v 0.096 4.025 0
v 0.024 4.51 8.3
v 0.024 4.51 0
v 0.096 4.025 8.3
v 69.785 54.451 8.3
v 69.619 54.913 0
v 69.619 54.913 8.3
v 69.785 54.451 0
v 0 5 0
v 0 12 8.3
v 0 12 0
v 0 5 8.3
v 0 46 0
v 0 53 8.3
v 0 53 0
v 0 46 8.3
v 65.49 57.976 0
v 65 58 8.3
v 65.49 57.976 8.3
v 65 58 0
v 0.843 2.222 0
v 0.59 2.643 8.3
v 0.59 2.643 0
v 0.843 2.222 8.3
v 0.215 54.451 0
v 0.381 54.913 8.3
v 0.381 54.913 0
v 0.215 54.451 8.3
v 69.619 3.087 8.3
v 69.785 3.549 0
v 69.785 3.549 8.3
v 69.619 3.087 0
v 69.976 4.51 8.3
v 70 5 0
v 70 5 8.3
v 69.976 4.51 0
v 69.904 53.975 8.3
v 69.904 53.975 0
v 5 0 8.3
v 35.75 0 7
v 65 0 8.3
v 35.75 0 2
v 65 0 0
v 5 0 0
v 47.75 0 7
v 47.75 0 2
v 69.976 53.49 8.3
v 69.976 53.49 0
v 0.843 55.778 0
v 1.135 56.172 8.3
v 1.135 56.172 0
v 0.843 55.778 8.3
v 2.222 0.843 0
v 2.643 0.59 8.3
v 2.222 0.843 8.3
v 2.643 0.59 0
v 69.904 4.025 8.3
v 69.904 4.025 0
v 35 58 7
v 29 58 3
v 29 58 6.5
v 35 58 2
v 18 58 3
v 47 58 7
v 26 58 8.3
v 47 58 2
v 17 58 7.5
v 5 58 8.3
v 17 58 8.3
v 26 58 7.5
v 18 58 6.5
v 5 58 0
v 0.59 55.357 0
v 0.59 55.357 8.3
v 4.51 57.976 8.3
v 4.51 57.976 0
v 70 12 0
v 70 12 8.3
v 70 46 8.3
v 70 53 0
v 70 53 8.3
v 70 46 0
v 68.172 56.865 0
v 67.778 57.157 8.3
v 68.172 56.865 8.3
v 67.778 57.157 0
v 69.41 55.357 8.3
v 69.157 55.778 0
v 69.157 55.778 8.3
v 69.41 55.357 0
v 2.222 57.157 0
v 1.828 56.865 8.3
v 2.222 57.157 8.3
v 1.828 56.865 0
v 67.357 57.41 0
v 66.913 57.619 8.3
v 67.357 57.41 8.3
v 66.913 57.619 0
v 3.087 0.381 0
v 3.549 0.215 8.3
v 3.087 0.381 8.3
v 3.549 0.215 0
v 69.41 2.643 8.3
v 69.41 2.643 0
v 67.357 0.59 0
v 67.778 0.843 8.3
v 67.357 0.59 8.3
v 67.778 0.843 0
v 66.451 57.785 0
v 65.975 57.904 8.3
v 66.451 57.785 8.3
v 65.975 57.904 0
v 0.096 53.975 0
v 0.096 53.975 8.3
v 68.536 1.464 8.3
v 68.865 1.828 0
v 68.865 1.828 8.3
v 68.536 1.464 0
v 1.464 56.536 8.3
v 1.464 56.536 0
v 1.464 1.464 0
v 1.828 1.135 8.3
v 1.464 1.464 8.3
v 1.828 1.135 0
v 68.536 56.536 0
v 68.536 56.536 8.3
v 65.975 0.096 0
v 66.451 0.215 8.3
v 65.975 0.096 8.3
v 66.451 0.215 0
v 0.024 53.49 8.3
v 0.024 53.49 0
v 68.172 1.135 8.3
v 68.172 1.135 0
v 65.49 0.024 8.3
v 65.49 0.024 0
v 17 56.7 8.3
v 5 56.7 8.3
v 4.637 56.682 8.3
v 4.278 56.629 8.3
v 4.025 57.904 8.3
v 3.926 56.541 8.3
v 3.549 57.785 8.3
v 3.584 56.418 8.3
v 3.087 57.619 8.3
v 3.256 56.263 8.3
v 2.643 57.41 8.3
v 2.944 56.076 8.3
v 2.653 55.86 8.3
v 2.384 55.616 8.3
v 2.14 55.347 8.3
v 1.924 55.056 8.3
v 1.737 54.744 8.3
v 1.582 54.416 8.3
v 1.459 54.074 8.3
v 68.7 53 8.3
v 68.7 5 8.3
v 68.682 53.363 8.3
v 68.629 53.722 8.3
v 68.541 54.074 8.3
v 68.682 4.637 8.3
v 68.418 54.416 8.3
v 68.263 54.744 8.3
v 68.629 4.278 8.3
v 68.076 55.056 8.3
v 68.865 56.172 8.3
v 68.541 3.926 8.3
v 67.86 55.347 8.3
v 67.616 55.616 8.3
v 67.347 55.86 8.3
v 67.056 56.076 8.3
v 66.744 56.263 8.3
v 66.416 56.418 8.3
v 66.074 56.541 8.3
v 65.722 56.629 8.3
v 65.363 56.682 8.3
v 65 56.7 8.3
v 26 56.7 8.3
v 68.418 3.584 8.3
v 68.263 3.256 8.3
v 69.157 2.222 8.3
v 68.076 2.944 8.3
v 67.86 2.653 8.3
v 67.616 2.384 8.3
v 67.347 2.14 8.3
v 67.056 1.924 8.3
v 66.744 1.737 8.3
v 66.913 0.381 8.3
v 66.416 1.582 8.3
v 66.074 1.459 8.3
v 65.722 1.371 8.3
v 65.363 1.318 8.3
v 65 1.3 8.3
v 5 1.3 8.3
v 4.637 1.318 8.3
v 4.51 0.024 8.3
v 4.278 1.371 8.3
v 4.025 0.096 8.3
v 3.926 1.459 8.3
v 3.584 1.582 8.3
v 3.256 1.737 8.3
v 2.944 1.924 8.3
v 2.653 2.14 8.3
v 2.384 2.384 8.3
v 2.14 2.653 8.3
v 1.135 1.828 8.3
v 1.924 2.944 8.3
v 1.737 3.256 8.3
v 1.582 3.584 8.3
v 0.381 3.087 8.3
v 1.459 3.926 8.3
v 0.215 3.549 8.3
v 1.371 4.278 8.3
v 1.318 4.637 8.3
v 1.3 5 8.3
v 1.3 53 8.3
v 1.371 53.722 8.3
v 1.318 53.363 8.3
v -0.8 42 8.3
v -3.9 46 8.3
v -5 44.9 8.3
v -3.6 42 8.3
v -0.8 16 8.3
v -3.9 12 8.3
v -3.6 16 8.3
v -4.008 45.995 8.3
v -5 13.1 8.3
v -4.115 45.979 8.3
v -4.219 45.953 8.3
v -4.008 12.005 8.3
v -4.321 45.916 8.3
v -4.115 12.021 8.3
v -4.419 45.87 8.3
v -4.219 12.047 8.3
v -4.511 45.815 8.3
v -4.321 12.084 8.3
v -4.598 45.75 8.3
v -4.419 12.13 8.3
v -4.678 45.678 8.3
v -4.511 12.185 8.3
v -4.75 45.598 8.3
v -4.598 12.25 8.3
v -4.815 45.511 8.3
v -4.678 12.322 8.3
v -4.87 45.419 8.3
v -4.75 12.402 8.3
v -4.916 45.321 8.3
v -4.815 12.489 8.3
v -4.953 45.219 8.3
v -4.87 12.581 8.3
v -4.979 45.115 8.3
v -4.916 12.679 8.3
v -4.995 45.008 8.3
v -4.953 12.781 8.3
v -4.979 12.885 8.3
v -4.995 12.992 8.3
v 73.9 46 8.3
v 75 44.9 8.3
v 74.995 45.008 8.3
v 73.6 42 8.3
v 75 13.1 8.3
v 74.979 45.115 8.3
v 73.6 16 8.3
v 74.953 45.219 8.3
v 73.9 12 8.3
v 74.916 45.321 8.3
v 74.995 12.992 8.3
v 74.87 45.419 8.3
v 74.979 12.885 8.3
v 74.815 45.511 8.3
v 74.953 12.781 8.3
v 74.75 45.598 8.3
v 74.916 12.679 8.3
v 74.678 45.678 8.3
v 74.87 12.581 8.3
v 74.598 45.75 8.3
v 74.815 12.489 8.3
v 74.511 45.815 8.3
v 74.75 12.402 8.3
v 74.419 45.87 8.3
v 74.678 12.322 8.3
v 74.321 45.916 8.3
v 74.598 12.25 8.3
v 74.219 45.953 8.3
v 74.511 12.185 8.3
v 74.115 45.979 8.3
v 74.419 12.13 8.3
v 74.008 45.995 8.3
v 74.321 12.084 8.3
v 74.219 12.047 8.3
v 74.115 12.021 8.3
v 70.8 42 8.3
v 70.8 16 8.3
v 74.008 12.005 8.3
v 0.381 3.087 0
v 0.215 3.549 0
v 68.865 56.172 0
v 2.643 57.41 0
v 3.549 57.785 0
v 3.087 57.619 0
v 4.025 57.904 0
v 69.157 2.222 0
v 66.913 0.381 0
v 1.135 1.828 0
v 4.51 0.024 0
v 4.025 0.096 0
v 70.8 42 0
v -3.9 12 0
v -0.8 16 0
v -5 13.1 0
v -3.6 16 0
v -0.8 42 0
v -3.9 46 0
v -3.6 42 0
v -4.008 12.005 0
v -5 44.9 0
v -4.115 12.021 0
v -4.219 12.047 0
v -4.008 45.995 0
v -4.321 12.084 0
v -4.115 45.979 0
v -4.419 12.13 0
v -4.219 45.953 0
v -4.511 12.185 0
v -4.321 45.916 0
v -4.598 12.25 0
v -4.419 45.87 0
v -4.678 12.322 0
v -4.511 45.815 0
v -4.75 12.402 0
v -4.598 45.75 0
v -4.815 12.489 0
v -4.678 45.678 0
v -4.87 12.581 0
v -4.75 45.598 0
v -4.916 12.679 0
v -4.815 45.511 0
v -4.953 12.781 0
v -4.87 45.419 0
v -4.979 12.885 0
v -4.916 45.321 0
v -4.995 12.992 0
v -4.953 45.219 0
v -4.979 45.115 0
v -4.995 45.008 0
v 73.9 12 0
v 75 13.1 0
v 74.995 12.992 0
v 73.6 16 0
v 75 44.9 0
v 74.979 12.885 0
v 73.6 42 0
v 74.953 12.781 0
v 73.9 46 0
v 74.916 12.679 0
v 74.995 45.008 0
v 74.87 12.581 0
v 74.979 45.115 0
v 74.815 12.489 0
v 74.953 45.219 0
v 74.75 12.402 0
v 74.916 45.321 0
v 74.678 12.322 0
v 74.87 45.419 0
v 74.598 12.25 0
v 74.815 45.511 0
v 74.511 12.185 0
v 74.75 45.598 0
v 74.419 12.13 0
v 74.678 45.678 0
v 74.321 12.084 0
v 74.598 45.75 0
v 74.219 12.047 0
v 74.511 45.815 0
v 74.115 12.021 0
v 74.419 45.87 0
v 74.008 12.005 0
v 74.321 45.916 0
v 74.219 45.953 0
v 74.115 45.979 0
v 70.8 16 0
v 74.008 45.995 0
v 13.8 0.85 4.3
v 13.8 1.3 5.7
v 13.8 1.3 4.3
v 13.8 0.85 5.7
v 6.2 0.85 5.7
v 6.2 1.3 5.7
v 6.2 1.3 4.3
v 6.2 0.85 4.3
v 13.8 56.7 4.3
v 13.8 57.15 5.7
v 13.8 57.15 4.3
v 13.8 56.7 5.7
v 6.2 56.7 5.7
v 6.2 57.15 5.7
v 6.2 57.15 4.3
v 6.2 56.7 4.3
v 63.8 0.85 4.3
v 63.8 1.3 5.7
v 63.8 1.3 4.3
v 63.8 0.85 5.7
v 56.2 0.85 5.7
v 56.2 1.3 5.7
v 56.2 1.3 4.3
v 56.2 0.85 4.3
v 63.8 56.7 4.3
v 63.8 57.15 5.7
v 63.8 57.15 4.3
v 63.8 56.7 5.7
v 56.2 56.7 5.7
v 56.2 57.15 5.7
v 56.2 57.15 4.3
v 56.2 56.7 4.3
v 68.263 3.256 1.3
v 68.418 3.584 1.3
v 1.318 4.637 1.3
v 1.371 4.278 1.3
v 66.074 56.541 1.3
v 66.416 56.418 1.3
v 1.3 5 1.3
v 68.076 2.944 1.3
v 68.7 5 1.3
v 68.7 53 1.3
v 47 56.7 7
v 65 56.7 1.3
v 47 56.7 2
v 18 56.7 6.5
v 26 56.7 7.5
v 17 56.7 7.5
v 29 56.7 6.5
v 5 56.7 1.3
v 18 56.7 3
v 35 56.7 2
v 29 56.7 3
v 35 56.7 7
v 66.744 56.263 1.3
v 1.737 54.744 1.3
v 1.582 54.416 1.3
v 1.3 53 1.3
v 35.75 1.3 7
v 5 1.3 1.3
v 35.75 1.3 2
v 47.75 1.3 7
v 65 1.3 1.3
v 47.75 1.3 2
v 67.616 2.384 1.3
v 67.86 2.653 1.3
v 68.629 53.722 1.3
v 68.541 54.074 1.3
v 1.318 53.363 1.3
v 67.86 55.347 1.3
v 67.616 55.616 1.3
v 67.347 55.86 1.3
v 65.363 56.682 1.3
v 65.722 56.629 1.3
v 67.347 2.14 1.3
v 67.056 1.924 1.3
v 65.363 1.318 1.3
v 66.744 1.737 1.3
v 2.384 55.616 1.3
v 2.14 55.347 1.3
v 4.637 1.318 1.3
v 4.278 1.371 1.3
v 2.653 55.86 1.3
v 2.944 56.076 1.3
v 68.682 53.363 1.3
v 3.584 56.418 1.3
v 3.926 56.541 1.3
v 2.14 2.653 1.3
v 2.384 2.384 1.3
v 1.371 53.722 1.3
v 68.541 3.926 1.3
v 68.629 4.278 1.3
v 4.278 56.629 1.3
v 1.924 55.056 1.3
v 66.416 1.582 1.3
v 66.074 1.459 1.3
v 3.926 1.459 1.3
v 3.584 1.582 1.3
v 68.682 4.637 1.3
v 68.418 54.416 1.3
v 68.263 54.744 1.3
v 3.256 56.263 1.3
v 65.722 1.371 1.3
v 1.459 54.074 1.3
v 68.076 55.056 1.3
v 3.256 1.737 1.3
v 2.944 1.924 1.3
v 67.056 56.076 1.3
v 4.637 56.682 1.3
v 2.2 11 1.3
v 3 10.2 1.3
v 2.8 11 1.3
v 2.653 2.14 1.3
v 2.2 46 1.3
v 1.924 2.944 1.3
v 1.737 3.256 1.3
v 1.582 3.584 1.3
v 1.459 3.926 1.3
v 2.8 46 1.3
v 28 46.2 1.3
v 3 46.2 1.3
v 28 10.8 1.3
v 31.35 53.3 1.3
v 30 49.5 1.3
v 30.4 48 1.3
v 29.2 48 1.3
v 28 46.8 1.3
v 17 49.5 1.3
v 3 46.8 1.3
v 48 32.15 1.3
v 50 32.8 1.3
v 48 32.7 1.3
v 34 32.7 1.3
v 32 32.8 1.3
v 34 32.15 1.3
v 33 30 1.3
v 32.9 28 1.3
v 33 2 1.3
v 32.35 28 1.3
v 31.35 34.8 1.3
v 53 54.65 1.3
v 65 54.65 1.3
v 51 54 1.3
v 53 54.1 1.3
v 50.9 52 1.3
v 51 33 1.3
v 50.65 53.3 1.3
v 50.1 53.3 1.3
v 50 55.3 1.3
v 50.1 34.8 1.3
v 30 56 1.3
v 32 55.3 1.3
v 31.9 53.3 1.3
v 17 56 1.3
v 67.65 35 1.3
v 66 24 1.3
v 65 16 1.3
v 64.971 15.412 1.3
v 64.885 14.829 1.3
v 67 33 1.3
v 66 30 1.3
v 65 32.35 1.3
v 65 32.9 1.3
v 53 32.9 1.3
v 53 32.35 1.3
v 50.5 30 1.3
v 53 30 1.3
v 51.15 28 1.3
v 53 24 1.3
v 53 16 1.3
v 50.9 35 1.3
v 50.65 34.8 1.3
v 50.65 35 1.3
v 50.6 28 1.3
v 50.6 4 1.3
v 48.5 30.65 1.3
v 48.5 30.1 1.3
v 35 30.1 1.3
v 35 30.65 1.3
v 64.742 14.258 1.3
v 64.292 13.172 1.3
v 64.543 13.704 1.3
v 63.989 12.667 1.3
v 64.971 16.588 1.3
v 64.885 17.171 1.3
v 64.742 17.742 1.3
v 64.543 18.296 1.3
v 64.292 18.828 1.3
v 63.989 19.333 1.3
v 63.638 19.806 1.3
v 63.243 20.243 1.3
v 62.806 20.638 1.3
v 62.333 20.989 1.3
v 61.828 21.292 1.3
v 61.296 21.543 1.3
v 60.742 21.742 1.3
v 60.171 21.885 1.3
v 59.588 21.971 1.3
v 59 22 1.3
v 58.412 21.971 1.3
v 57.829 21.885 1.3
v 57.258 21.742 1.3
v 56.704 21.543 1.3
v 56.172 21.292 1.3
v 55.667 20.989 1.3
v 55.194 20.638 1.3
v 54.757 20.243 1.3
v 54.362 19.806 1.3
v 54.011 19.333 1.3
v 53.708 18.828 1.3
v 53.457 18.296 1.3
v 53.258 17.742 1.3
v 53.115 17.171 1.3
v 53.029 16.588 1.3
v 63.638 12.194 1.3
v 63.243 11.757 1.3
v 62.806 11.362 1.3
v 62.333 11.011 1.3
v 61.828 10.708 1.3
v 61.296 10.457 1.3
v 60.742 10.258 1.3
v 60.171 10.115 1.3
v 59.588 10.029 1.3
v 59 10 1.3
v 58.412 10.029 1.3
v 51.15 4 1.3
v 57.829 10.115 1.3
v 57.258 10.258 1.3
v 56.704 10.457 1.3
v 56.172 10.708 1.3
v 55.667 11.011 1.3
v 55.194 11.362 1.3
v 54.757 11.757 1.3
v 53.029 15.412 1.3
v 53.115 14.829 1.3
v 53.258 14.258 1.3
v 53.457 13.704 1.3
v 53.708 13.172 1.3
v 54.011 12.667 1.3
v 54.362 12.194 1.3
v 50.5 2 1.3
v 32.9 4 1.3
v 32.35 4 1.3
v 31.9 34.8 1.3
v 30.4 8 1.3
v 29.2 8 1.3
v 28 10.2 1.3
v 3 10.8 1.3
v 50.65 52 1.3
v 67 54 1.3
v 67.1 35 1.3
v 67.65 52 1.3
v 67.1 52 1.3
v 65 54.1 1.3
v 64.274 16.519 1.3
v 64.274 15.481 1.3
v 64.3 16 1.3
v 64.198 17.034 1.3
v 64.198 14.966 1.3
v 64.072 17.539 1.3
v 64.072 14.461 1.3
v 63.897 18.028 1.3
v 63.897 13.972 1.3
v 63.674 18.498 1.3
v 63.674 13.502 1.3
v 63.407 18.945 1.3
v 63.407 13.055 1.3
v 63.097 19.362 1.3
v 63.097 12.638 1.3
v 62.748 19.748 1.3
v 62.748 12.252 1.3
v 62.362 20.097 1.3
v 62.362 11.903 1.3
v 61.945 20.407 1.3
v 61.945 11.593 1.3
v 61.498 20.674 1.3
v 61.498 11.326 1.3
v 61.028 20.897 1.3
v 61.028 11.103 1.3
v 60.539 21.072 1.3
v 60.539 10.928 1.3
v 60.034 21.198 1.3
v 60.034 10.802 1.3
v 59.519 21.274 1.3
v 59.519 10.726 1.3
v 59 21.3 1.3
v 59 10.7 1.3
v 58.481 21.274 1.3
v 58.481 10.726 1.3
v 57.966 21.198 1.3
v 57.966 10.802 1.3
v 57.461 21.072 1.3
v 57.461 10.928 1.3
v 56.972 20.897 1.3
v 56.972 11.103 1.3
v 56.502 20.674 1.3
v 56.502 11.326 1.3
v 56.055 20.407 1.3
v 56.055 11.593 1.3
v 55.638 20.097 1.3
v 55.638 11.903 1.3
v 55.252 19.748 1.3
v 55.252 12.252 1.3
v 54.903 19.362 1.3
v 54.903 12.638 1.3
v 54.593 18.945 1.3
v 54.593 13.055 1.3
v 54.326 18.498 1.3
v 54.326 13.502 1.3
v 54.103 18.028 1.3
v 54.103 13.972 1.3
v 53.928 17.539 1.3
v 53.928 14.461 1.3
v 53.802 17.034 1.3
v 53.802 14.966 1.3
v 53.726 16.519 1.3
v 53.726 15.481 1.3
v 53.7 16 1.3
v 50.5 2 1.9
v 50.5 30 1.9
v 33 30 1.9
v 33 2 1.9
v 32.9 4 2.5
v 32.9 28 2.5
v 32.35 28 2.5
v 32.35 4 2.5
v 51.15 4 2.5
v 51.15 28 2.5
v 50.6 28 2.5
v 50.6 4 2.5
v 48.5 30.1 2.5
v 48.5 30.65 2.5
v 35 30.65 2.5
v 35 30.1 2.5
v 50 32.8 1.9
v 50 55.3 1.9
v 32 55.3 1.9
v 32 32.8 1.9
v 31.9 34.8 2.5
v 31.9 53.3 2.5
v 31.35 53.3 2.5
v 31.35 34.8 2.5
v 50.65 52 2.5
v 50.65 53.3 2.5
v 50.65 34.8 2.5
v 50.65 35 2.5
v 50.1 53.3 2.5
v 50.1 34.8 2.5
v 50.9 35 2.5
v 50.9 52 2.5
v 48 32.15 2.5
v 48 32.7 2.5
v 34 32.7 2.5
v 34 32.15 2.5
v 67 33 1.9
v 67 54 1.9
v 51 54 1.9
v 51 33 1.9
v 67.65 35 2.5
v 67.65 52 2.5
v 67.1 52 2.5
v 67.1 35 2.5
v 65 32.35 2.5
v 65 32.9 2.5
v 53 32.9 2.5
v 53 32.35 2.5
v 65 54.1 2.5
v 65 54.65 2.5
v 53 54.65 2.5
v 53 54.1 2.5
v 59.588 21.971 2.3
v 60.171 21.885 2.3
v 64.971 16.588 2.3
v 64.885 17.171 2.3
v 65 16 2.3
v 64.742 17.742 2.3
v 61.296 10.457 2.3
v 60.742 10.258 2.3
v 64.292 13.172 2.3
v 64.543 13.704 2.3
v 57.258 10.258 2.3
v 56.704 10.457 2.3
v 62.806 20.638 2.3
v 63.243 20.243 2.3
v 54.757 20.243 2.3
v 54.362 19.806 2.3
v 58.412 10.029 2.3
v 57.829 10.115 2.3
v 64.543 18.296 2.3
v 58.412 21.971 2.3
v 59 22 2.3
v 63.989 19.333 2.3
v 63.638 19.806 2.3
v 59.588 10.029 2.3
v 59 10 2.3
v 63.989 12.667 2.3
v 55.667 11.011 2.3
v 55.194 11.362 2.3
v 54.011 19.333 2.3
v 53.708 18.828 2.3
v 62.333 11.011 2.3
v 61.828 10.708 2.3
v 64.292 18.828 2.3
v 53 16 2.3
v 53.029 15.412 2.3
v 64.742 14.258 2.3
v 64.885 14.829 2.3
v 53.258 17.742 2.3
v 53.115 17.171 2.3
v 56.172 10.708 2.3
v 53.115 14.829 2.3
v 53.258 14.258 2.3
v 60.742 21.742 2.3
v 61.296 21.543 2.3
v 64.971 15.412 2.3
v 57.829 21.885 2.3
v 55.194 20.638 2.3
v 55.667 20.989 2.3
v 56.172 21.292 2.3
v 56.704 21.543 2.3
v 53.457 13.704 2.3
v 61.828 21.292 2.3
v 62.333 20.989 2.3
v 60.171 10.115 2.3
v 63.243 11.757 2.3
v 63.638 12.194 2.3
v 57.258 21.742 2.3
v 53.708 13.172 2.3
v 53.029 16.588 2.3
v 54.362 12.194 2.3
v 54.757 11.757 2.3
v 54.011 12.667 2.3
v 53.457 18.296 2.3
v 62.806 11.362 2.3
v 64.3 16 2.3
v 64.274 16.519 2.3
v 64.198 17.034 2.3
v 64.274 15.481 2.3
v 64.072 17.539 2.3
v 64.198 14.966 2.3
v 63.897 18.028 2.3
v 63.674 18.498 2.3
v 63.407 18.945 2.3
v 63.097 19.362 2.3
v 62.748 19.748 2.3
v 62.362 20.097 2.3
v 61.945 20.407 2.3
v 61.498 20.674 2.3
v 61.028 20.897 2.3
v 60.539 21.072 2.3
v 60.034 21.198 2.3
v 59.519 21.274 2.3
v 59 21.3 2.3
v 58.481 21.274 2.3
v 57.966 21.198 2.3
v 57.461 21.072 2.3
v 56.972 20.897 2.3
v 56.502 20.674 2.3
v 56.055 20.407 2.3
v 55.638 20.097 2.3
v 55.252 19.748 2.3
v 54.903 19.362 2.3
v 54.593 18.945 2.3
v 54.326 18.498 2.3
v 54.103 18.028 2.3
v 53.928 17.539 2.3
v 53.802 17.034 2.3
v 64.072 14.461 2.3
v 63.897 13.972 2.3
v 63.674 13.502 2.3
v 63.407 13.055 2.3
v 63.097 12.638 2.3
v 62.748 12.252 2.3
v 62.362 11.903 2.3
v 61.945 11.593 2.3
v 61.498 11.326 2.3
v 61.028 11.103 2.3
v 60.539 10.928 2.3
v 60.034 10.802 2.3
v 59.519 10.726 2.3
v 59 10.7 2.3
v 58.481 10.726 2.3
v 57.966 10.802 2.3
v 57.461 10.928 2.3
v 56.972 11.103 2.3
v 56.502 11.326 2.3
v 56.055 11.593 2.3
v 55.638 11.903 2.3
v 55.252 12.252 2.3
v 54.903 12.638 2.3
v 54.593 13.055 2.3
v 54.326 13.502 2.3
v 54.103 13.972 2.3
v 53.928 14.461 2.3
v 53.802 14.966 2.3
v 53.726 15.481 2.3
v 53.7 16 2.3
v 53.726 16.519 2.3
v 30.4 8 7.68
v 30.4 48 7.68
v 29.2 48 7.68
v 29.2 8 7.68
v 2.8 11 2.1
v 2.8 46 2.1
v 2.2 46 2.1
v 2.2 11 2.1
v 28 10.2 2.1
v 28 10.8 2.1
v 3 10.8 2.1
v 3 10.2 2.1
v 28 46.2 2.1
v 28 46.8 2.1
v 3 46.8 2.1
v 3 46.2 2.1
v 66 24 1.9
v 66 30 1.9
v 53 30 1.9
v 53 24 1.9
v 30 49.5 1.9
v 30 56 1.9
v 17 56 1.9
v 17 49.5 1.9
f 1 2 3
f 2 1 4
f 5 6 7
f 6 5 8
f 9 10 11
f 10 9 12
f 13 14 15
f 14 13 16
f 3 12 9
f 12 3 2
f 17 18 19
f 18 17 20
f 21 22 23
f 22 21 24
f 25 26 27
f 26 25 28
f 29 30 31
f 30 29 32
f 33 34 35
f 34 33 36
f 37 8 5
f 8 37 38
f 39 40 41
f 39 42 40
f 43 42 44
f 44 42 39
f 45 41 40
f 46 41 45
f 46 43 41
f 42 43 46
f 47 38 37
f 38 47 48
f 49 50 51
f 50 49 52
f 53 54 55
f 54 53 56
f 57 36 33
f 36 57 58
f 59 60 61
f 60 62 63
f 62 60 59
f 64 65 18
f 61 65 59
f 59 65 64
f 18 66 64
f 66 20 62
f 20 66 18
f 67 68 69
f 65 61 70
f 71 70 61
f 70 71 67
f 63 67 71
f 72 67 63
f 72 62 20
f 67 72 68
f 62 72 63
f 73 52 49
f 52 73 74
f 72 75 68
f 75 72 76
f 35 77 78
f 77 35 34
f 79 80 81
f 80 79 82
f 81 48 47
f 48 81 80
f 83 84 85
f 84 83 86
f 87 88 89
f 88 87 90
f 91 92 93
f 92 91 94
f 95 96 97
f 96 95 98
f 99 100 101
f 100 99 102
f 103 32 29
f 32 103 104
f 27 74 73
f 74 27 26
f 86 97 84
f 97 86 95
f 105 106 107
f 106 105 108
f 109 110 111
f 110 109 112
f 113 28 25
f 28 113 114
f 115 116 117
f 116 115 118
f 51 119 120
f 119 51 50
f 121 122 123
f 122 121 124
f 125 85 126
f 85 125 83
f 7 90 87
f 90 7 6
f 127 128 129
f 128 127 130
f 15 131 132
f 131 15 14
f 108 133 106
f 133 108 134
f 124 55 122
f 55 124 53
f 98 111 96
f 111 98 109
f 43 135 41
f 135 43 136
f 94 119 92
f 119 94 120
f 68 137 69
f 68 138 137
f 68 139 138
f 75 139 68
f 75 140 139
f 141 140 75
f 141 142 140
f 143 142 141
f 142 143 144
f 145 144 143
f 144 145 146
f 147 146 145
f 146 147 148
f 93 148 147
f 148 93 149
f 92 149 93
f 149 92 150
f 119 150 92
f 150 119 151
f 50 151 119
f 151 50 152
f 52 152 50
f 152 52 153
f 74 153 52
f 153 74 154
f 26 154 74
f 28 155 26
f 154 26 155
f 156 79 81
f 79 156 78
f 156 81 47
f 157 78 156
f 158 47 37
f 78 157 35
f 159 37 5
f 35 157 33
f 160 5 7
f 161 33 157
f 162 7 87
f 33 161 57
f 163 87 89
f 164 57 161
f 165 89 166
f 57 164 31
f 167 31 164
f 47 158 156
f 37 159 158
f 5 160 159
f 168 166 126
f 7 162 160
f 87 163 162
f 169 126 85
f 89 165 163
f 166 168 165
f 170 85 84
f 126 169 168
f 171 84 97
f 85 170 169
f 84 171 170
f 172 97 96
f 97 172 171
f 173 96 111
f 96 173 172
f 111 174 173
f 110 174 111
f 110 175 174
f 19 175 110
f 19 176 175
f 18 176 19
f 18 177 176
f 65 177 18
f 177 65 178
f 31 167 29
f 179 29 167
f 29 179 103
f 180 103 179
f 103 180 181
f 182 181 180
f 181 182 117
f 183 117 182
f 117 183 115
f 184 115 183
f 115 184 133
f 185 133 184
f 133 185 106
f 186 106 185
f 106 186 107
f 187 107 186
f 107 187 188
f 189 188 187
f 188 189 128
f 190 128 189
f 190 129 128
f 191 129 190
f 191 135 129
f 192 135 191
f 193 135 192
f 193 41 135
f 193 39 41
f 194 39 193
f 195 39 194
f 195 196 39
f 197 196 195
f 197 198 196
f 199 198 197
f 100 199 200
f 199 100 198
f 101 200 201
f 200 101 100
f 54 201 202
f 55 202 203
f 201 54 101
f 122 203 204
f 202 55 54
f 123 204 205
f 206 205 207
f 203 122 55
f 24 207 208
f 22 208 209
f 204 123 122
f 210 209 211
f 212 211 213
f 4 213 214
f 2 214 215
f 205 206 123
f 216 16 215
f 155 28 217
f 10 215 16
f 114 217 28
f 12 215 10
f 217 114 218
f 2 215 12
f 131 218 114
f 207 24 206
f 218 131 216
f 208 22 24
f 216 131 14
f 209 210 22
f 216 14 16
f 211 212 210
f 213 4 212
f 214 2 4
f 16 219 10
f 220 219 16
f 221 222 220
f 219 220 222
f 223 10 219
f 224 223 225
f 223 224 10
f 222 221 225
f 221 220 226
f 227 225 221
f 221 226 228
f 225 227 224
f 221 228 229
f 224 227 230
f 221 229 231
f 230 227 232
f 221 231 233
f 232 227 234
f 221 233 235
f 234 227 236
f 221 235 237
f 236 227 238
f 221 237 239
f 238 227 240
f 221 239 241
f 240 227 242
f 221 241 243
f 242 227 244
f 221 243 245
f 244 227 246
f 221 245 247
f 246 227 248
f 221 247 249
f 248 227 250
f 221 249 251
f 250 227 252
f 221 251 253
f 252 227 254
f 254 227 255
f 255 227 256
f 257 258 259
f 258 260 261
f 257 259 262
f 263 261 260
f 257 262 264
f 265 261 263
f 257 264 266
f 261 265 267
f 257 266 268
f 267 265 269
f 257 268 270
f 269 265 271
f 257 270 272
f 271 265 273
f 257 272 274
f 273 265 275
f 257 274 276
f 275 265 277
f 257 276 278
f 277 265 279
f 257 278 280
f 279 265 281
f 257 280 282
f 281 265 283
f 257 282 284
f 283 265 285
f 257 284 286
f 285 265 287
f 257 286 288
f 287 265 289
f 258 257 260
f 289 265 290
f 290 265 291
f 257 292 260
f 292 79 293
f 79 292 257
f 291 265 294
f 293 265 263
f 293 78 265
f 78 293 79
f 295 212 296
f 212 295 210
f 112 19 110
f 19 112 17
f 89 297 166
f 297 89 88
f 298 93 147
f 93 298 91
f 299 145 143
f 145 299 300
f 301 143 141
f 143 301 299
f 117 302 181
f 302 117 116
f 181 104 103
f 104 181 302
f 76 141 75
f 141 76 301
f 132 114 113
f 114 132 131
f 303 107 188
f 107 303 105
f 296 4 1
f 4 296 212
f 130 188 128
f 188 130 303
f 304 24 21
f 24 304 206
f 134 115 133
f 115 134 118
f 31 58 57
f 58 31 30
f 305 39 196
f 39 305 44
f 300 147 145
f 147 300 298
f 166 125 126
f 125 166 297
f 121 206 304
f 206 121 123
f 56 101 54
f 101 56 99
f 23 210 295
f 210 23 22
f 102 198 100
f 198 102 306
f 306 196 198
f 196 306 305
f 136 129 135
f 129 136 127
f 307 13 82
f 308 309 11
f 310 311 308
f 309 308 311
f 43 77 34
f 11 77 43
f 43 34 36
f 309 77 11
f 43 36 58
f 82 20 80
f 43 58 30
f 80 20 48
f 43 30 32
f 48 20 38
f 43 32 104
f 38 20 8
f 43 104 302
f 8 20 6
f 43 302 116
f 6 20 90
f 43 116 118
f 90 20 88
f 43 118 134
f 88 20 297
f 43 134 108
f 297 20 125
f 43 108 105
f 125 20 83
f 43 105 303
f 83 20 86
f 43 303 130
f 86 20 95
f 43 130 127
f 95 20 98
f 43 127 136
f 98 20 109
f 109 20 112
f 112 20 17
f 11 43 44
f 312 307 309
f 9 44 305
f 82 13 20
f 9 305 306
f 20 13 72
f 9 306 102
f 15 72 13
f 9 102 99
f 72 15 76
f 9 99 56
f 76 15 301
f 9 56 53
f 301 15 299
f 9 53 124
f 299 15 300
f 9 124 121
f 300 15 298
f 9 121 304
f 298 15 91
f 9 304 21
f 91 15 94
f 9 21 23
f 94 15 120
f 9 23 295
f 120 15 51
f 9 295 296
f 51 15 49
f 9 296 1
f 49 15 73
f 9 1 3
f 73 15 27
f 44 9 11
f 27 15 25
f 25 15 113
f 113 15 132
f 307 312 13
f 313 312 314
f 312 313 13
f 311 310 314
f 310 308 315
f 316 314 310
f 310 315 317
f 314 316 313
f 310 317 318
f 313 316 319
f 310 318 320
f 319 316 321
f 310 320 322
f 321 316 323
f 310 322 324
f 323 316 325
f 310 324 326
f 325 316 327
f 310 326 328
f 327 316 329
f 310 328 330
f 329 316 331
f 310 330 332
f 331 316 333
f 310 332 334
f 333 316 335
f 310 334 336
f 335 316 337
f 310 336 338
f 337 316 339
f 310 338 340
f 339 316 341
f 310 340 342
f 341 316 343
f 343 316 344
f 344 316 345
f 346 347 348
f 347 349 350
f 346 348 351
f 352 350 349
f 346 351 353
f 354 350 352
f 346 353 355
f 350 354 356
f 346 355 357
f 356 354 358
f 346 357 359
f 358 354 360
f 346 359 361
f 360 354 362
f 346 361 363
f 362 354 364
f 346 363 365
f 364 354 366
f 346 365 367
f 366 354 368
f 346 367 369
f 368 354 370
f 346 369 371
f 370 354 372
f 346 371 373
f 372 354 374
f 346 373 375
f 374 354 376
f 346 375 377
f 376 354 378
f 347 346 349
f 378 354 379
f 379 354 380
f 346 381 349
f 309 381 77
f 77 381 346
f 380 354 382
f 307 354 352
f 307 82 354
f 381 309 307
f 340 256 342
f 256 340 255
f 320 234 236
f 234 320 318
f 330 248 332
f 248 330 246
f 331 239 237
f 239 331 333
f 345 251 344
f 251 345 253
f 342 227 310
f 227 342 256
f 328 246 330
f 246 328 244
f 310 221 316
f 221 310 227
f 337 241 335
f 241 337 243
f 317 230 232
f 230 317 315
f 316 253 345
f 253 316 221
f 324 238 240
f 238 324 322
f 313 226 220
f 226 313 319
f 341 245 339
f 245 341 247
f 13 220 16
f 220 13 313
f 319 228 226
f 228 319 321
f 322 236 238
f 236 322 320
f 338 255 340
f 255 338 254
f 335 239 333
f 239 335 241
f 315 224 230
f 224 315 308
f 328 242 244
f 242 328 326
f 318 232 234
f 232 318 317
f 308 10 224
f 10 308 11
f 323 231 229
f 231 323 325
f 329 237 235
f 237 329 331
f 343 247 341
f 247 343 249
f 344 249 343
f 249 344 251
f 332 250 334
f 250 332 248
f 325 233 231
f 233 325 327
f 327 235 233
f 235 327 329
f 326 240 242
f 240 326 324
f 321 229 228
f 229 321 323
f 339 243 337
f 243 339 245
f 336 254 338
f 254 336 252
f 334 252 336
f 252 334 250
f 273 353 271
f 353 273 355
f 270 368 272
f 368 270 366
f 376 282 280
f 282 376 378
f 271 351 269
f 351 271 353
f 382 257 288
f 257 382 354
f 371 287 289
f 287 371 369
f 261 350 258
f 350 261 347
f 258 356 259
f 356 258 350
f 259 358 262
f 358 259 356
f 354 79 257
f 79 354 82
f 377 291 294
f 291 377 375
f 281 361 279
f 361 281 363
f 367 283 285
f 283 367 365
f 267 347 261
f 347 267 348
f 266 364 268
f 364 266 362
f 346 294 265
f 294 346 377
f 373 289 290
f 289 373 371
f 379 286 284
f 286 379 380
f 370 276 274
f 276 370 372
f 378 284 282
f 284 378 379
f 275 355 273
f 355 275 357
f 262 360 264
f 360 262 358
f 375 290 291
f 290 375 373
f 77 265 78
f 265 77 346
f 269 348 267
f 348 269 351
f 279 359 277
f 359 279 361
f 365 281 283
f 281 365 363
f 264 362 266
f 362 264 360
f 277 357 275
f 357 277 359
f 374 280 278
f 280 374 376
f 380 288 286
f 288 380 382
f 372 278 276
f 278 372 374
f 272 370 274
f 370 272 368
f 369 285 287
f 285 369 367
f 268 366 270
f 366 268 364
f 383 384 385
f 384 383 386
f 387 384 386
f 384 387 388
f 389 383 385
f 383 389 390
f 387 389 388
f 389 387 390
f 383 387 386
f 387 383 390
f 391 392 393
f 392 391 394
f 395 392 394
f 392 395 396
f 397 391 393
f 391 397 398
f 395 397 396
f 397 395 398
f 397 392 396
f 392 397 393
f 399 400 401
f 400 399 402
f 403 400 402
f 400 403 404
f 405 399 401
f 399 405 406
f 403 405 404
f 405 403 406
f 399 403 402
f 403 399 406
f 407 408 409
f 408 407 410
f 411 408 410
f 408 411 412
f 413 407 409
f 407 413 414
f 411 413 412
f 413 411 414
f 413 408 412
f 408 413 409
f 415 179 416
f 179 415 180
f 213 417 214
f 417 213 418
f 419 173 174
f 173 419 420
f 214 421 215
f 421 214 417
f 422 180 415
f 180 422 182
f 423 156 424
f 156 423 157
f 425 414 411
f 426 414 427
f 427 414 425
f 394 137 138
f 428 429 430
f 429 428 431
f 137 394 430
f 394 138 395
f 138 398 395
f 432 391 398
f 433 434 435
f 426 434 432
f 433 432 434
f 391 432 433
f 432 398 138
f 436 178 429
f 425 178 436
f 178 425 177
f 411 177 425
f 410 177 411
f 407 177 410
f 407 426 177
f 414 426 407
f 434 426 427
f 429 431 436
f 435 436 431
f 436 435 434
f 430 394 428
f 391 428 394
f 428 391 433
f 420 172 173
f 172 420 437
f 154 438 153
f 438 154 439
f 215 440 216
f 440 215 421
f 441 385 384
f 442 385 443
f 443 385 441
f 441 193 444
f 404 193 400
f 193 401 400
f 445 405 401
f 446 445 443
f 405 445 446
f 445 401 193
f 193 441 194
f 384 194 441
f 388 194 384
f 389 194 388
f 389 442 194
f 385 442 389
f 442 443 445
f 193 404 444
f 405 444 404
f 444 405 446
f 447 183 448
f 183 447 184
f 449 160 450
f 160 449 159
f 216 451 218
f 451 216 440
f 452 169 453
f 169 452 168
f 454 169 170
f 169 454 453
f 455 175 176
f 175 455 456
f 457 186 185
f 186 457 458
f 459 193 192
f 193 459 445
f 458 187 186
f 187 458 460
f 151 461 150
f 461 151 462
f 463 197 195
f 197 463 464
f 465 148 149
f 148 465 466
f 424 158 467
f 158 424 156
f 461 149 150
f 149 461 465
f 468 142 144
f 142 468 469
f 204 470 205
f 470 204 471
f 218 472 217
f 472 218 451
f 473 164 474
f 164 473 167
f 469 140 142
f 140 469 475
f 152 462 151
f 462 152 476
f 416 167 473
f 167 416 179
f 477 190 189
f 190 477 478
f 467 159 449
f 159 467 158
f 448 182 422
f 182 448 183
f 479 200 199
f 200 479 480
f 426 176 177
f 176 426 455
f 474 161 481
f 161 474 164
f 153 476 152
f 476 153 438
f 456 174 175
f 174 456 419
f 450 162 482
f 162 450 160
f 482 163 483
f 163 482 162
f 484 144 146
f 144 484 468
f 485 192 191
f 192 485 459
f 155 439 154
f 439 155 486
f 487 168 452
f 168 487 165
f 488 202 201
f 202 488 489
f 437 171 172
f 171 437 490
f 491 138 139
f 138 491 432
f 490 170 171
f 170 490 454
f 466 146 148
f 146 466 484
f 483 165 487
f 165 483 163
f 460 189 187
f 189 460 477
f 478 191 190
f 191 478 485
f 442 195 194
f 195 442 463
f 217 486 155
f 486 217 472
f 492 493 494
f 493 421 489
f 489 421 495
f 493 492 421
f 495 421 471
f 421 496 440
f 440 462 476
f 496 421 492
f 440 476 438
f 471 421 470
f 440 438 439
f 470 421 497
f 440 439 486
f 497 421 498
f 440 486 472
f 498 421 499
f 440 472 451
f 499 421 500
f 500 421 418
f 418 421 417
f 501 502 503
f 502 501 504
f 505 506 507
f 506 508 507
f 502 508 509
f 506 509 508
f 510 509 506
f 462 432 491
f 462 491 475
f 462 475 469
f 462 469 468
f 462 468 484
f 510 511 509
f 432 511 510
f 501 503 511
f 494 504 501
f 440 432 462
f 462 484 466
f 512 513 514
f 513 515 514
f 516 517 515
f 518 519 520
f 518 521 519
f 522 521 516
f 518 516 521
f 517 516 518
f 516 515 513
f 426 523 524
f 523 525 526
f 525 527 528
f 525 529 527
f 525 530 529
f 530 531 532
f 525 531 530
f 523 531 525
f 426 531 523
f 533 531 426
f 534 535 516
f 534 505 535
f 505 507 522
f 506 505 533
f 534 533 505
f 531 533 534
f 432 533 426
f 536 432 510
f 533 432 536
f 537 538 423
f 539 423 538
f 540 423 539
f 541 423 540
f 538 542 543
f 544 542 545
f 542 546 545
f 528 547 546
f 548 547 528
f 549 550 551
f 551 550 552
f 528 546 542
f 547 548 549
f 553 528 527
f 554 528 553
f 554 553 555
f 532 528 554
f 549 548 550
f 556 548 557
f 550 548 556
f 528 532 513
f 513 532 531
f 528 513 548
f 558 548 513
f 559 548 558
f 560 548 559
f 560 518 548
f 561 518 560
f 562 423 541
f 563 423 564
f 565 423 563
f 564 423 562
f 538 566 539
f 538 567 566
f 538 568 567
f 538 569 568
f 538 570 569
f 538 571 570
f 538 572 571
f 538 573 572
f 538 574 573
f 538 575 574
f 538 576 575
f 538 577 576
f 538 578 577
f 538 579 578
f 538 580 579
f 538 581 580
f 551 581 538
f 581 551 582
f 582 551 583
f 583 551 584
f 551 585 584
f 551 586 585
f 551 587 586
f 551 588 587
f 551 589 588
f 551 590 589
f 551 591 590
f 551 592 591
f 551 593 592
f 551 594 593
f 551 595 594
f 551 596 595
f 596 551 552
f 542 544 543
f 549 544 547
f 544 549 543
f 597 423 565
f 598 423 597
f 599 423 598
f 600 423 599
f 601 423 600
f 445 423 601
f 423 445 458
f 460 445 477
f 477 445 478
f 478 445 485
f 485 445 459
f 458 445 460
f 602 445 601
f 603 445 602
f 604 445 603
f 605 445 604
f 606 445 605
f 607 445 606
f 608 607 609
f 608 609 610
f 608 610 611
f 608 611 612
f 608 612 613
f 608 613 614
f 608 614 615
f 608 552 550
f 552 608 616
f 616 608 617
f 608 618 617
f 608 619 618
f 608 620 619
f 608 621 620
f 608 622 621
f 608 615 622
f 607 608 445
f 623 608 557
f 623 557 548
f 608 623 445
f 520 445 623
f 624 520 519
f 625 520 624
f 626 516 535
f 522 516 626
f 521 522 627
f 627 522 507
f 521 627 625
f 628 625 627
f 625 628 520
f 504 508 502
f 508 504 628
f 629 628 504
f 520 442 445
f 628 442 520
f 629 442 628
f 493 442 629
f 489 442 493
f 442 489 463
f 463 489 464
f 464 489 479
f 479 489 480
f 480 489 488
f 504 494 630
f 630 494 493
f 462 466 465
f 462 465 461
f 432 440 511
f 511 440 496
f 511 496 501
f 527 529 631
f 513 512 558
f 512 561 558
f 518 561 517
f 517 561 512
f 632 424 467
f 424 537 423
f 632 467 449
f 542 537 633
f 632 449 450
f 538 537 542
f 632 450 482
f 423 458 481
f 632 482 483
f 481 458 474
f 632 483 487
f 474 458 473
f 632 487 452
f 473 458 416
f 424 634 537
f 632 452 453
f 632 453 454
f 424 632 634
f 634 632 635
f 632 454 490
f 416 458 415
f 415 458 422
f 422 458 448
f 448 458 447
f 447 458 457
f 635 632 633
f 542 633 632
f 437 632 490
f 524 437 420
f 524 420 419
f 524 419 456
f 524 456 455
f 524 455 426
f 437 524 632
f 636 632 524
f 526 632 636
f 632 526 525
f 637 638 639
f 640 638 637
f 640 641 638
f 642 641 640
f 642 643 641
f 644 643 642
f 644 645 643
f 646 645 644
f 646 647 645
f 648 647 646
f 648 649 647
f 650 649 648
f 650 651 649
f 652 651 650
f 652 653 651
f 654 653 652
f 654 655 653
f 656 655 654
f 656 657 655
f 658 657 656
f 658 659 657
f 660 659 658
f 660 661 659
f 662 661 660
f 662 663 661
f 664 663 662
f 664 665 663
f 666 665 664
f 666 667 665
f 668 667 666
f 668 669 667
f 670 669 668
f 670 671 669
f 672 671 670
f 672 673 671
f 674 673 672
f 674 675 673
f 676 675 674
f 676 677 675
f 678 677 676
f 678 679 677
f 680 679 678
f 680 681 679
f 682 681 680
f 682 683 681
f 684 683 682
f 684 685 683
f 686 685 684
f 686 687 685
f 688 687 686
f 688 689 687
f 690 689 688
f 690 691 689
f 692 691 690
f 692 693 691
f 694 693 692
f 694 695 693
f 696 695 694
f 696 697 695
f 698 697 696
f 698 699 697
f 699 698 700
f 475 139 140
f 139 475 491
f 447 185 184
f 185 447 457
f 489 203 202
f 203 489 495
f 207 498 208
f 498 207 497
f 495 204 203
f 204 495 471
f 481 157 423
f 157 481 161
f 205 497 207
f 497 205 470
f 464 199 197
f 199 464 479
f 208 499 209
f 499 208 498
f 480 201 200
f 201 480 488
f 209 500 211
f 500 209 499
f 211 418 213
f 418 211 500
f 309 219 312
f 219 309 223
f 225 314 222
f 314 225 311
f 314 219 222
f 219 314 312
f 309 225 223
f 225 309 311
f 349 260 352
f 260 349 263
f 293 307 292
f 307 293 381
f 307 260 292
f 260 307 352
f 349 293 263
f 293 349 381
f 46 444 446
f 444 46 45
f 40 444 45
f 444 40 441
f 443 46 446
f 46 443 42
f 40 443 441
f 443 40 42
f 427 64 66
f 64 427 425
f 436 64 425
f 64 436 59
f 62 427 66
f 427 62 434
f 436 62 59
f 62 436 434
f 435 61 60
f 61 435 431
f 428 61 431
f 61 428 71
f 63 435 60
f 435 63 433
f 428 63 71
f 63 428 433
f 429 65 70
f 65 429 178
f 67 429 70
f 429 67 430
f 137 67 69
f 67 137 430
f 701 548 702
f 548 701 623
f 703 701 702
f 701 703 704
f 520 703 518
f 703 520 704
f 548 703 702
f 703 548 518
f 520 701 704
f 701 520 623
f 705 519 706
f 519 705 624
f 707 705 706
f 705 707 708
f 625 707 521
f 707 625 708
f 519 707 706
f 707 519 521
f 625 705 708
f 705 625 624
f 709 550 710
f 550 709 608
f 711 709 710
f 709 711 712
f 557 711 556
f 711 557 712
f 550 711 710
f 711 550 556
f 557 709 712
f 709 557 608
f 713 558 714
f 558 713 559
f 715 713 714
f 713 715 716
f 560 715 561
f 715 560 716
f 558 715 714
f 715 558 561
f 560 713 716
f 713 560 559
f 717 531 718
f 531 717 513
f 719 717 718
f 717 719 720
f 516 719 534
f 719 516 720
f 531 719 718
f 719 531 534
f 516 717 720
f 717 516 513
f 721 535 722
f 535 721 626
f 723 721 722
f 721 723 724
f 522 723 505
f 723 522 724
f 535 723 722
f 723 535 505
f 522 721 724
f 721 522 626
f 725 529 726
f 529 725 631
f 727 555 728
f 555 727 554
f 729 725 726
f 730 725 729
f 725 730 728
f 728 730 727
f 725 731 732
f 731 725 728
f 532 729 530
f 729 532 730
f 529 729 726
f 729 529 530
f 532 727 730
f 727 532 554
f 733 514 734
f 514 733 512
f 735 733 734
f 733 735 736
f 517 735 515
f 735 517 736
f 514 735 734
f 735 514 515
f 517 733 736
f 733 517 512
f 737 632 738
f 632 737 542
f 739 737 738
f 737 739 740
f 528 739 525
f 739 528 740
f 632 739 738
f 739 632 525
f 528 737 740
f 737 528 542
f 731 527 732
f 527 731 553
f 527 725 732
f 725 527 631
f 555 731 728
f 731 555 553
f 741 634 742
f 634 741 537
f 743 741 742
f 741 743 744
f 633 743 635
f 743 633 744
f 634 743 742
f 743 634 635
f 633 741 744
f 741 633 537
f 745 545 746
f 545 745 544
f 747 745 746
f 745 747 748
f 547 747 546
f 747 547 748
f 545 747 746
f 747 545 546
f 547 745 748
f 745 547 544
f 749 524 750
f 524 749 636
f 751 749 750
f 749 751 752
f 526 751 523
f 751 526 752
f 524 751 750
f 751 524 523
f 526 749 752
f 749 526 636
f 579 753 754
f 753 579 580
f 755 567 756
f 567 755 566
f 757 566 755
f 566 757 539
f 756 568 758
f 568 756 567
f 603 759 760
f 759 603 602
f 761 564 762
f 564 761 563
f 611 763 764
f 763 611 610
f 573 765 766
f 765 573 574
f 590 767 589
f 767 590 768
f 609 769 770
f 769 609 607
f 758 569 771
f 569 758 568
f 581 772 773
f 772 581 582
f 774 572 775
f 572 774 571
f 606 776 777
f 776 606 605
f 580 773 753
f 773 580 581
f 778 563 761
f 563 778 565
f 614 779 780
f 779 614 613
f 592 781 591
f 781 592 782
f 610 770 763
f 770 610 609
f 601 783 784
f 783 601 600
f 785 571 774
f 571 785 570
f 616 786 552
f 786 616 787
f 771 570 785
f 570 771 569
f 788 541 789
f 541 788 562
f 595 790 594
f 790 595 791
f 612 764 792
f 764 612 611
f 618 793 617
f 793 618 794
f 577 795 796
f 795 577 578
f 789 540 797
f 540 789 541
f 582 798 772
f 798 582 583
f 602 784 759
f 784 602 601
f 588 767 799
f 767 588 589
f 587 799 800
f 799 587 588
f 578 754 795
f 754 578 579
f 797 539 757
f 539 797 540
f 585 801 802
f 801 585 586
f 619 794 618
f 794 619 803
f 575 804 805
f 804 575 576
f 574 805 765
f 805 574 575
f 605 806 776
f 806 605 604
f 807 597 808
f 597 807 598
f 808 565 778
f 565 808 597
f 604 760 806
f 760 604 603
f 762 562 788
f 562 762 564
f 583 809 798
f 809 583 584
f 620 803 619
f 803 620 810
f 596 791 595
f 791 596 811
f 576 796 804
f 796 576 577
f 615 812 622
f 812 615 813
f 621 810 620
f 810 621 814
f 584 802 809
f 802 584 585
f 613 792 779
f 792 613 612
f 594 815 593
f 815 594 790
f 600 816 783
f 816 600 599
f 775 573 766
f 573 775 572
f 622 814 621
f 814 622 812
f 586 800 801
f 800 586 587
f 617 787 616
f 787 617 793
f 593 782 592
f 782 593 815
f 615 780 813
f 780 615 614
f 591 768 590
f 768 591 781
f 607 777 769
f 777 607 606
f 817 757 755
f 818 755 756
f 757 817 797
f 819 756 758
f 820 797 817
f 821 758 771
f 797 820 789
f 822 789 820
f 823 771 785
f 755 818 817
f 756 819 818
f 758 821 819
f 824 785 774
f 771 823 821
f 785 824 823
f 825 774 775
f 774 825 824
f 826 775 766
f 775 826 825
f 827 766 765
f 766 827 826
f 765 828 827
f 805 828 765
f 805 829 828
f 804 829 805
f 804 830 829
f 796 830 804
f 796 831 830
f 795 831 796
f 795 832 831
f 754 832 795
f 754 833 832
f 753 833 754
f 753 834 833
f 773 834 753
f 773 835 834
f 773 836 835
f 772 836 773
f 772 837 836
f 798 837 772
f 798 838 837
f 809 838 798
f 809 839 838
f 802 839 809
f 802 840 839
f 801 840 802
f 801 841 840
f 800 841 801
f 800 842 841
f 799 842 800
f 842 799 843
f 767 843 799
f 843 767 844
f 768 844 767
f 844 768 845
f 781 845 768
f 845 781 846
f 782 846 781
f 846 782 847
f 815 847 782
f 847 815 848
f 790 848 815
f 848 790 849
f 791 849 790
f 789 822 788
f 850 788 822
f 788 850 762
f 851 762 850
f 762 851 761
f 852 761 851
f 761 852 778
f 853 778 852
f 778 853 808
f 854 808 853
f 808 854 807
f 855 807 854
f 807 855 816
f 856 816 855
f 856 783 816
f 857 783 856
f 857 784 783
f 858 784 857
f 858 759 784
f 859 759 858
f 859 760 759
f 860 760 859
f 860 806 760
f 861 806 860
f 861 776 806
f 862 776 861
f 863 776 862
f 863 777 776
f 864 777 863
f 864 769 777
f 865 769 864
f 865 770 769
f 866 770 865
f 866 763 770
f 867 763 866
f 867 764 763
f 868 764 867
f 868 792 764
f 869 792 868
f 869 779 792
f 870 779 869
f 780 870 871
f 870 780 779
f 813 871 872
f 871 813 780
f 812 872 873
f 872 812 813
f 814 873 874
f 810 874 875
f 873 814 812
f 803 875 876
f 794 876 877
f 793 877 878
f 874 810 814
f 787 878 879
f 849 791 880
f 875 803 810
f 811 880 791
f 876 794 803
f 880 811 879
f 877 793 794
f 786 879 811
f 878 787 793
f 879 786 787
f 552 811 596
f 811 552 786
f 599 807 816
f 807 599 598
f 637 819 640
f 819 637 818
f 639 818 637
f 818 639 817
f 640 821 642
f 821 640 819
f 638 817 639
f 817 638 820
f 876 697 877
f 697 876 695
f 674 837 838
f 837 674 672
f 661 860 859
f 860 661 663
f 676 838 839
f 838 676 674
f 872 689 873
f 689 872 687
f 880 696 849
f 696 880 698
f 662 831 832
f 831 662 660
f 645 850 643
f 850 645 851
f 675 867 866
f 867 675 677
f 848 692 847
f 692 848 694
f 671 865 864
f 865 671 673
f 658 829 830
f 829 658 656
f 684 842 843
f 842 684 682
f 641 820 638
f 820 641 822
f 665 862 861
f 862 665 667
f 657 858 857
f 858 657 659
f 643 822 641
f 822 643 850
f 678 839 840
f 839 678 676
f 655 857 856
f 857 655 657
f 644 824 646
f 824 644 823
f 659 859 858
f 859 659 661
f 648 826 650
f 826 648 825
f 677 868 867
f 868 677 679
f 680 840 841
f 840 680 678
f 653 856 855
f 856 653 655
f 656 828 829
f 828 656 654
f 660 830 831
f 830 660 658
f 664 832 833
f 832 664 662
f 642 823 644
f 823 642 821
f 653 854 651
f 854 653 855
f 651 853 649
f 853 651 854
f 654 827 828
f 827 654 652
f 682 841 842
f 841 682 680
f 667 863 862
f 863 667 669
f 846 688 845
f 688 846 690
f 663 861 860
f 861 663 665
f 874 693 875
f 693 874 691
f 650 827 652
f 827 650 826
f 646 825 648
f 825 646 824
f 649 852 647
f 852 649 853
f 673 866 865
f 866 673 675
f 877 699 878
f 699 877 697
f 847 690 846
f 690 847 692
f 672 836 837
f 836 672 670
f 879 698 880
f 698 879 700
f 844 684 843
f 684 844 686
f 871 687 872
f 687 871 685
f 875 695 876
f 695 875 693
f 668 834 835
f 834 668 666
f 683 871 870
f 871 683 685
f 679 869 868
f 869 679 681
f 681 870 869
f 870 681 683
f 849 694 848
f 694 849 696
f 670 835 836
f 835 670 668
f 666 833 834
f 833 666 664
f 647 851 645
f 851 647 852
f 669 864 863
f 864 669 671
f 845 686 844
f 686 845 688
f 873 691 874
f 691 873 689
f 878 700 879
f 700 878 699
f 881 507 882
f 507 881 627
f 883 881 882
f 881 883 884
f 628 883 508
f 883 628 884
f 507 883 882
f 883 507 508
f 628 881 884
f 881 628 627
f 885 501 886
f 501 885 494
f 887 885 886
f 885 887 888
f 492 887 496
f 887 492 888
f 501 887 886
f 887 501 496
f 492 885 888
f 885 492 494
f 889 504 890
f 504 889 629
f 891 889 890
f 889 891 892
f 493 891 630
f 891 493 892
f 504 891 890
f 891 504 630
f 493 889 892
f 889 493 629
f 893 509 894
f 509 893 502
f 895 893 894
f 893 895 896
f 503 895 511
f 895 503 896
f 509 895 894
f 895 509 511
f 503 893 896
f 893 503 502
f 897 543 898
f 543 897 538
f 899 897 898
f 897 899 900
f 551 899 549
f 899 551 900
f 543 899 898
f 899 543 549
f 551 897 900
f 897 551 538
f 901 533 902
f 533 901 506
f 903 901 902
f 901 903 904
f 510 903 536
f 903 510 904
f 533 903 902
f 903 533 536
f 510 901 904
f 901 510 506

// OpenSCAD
// Spine Smart v3 — revised prototype for stage I.
// Nominal component envelopes from Sizes-1.pdf, not measured purchased parts.
// Units: mm. Print bottom and lid separately; do not print assembled view.
$fn=64;
mode=1; // 0 assembled, 1 bottom, 2 lid on bed, 3 exploded, 4 component plan
L=70; W=58; H=9.6;
wall=1.3; floor_t=1.3; lid_t=1.3; base_h=H-lid_t; corner=5;
clip_x=[10,60]; clip_width=7; clip_t=0.7; clip_gap=0.25;
clip_length=4.5; catch_depth=0.30;
// Adjustable connector openings: verify alignment with actual modules.
charge_x=41.75; esp_usb_x=41; usb_width=12; usb_height=5; usb_z=2.0;
switch_x=18; switch_slot_w=11; switch_slot_h=3.5; switch_z=3.0;

module rounded_box(l,w,h,r) {
    linear_extrude(height=h)
        hull() for(x=[r,l-r],y=[r,w-r]) translate([x,y]) circle(r=r);
}

module board_seat(x,y,w,l,front_open=false,back_open=false) {
    // Adhesive seat, not an unverified screw-hole pattern.
    translate([x,y,floor_t-0.02]) cube([w,l,0.62]);
    translate([x-0.65,y+2,floor_t-0.02]) cube([0.55,l-4,1.22]);
    translate([x+w+0.1,y+2,floor_t-0.02]) cube([0.55,l-4,1.22]);
    if(!front_open) translate([x+2,y-0.65,floor_t-0.02]) cube([w-4,0.55,1.22]);
    if(!back_open) translate([x+2,y+l+0.1,floor_t-0.02]) cube([w-4,0.55,1.22]);
}

module bottom() {
    union() {
        difference() {
            union() {
                rounded_box(L,W,base_h,corner);
                // Closed strap loops: through holes along Z, linked at both ends.
                translate([-5,(W-34)/2,0]) rounded_box(6.1,34,base_h,1.1);
                translate([L-1.1,(W-34)/2,0]) rounded_box(6.1,34,base_h,1.1);
            }
            translate([wall,wall,floor_t])
                rounded_box(L-2*wall,W-2*wall,base_h+0.2,corner-wall);
            translate([-3.6,(W-26)/2,-0.1]) cube([2.8,26,base_h+0.2]);
            translate([L+0.8,(W-26)/2,-0.1]) cube([2.8,26,base_h+0.2]);
            // Four local snap pockets; solid wall above each pocket.
            for(xx=clip_x) {
                translate([xx-3.8,wall-0.45,base_h-4.0]) cube([7.6,0.75,1.4]);
                translate([xx-3.8,W-wall-0.30,base_h-4.0]) cube([7.6,0.75,1.4]);
            }
            // Charging USB-C and programming USB-C, on opposite ends.
            translate([charge_x-usb_width/2,-0.1,usb_z]) cube([usb_width,wall+0.2,usb_height]);
            translate([esp_usb_x-usb_width/2,W-wall-0.1,usb_z]) cube([usb_width,wall+0.2,usb_height]);
            // Switch actuator opening. Tune to the actual purchased switch.
            translate([switch_x,W-wall-0.1,switch_z]) cube([switch_slot_w,wall+0.2,switch_slot_h]);
            // Nail recess, away from ports, under the lid edge.
            translate([17,W-wall-0.1,base_h-0.8]) cube([9,wall+0.2,1.0]);
        }
        // Battery / electronics separator; end gaps allow wires around it.
        translate([29.2,8,floor_t-0.02]) cube([1.2,40,base_h-floor_t-0.6]);
        // Battery locating stops; mounting with a thin adhesive strip.
        translate([2.2,11,floor_t-0.02]) cube([0.6,35,0.82]);
        translate([3,10.2,floor_t-0.02]) cube([25,0.6,0.82]);
        translate([3,46.2,floor_t-0.02]) cube([25,0.6,0.82]);
        board_seat(33,2,17.5,28,true,false); // TP4056, connector faces front
        board_seat(32,32.8,18,22.5,false,true); // ESP32-C3, USB faces rear
        board_seat(51,33,16,21); // MPU6050, direct soldering, no pin headers
        // Coin motor locator. Inner diameter allows a nominal 10 mm motor.
        translate([59,16,floor_t-0.02]) difference() {
            cylinder(d=12,h=1.02);
            translate([0,0,-0.1]) cylinder(d=10.6,h=1.3);
        }
        // Free mounting seats for driver passives and switch.
        translate([53,24,floor_t-0.02]) cube([13,6,0.62]);
        translate([17,49.5,floor_t-0.02]) cube([13,6.5,0.62]);
    }
}

module front_clip(xx) {
    translate([xx-clip_width/2,wall+clip_gap,-clip_length])
        cube([clip_width,clip_t,clip_length+0.04]);
    // Symmetric ramps allow both closing and deliberate reopening.
    translate([xx-clip_width/2,0,0]) rotate([90,0,90])
        linear_extrude(height=clip_width)
            polygon([[wall+clip_gap+0.02,-3.95],
                     [wall-catch_depth,-3.55],
                     [wall-catch_depth,-3.05],
                     [wall+clip_gap+0.02,-2.65]]);
}

module lid() {
    union() {
        rounded_box(L,W,lid_t,corner);
        for(xx=clip_x) {
            front_clip(xx);
            translate([0,W,0]) mirror([0,1,0]) front_clip(xx);
        }
        // Small guides in clear side margins, away from battery and boards.
        for(yy=[6,51]) {
            translate([wall+0.25,yy-1,-0.8]) cube([0.6,2,0.84]);
            translate([L-wall-0.85,yy-1,-0.8]) cube([0.6,2,0.84]);
        }
    }
}

module components() {
    // Heights represent full nominal module envelopes, not just PCB thickness.
    color("orange") translate([3,11,floor_t+0.2]) cube([25,35,6]);
    color("teal") translate([33,2,floor_t+0.8]) cube([17.5,28,4]);
    color("royalblue") translate([32,32.8,floor_t+0.8]) cube([18,22.5,3.8]);
    color("purple") translate([51,33,floor_t+0.8]) cube([16,21,2.8]);
    color("hotpink") translate([59,16,floor_t+0.2]) cylinder(d=10,h=3);
    // Switch outline is an allocation only: it must be measured.
    color("gray") translate([17.5,50,floor_t+0.8]) cube([12,6,5]);
}

if(mode==0) {
    color([0.2,0.35,0.45]) bottom();
    color([0.45,0.6,0.7]) translate([0,0,base_h]) lid();
} else if(mode==1) bottom();
else if(mode==2) translate([0,W,lid_t]) rotate([180,0,0]) lid();
else if(mode==3) {
    color([0.2,0.35,0.45,0.65]) bottom();
    components();
    color([0.45,0.6,0.7,0.8]) translate([0,0,base_h+16]) lid();
} else if(mode==4) {
    color([0.2,0.35,0.45,0.35]) bottom();
    components();
}
